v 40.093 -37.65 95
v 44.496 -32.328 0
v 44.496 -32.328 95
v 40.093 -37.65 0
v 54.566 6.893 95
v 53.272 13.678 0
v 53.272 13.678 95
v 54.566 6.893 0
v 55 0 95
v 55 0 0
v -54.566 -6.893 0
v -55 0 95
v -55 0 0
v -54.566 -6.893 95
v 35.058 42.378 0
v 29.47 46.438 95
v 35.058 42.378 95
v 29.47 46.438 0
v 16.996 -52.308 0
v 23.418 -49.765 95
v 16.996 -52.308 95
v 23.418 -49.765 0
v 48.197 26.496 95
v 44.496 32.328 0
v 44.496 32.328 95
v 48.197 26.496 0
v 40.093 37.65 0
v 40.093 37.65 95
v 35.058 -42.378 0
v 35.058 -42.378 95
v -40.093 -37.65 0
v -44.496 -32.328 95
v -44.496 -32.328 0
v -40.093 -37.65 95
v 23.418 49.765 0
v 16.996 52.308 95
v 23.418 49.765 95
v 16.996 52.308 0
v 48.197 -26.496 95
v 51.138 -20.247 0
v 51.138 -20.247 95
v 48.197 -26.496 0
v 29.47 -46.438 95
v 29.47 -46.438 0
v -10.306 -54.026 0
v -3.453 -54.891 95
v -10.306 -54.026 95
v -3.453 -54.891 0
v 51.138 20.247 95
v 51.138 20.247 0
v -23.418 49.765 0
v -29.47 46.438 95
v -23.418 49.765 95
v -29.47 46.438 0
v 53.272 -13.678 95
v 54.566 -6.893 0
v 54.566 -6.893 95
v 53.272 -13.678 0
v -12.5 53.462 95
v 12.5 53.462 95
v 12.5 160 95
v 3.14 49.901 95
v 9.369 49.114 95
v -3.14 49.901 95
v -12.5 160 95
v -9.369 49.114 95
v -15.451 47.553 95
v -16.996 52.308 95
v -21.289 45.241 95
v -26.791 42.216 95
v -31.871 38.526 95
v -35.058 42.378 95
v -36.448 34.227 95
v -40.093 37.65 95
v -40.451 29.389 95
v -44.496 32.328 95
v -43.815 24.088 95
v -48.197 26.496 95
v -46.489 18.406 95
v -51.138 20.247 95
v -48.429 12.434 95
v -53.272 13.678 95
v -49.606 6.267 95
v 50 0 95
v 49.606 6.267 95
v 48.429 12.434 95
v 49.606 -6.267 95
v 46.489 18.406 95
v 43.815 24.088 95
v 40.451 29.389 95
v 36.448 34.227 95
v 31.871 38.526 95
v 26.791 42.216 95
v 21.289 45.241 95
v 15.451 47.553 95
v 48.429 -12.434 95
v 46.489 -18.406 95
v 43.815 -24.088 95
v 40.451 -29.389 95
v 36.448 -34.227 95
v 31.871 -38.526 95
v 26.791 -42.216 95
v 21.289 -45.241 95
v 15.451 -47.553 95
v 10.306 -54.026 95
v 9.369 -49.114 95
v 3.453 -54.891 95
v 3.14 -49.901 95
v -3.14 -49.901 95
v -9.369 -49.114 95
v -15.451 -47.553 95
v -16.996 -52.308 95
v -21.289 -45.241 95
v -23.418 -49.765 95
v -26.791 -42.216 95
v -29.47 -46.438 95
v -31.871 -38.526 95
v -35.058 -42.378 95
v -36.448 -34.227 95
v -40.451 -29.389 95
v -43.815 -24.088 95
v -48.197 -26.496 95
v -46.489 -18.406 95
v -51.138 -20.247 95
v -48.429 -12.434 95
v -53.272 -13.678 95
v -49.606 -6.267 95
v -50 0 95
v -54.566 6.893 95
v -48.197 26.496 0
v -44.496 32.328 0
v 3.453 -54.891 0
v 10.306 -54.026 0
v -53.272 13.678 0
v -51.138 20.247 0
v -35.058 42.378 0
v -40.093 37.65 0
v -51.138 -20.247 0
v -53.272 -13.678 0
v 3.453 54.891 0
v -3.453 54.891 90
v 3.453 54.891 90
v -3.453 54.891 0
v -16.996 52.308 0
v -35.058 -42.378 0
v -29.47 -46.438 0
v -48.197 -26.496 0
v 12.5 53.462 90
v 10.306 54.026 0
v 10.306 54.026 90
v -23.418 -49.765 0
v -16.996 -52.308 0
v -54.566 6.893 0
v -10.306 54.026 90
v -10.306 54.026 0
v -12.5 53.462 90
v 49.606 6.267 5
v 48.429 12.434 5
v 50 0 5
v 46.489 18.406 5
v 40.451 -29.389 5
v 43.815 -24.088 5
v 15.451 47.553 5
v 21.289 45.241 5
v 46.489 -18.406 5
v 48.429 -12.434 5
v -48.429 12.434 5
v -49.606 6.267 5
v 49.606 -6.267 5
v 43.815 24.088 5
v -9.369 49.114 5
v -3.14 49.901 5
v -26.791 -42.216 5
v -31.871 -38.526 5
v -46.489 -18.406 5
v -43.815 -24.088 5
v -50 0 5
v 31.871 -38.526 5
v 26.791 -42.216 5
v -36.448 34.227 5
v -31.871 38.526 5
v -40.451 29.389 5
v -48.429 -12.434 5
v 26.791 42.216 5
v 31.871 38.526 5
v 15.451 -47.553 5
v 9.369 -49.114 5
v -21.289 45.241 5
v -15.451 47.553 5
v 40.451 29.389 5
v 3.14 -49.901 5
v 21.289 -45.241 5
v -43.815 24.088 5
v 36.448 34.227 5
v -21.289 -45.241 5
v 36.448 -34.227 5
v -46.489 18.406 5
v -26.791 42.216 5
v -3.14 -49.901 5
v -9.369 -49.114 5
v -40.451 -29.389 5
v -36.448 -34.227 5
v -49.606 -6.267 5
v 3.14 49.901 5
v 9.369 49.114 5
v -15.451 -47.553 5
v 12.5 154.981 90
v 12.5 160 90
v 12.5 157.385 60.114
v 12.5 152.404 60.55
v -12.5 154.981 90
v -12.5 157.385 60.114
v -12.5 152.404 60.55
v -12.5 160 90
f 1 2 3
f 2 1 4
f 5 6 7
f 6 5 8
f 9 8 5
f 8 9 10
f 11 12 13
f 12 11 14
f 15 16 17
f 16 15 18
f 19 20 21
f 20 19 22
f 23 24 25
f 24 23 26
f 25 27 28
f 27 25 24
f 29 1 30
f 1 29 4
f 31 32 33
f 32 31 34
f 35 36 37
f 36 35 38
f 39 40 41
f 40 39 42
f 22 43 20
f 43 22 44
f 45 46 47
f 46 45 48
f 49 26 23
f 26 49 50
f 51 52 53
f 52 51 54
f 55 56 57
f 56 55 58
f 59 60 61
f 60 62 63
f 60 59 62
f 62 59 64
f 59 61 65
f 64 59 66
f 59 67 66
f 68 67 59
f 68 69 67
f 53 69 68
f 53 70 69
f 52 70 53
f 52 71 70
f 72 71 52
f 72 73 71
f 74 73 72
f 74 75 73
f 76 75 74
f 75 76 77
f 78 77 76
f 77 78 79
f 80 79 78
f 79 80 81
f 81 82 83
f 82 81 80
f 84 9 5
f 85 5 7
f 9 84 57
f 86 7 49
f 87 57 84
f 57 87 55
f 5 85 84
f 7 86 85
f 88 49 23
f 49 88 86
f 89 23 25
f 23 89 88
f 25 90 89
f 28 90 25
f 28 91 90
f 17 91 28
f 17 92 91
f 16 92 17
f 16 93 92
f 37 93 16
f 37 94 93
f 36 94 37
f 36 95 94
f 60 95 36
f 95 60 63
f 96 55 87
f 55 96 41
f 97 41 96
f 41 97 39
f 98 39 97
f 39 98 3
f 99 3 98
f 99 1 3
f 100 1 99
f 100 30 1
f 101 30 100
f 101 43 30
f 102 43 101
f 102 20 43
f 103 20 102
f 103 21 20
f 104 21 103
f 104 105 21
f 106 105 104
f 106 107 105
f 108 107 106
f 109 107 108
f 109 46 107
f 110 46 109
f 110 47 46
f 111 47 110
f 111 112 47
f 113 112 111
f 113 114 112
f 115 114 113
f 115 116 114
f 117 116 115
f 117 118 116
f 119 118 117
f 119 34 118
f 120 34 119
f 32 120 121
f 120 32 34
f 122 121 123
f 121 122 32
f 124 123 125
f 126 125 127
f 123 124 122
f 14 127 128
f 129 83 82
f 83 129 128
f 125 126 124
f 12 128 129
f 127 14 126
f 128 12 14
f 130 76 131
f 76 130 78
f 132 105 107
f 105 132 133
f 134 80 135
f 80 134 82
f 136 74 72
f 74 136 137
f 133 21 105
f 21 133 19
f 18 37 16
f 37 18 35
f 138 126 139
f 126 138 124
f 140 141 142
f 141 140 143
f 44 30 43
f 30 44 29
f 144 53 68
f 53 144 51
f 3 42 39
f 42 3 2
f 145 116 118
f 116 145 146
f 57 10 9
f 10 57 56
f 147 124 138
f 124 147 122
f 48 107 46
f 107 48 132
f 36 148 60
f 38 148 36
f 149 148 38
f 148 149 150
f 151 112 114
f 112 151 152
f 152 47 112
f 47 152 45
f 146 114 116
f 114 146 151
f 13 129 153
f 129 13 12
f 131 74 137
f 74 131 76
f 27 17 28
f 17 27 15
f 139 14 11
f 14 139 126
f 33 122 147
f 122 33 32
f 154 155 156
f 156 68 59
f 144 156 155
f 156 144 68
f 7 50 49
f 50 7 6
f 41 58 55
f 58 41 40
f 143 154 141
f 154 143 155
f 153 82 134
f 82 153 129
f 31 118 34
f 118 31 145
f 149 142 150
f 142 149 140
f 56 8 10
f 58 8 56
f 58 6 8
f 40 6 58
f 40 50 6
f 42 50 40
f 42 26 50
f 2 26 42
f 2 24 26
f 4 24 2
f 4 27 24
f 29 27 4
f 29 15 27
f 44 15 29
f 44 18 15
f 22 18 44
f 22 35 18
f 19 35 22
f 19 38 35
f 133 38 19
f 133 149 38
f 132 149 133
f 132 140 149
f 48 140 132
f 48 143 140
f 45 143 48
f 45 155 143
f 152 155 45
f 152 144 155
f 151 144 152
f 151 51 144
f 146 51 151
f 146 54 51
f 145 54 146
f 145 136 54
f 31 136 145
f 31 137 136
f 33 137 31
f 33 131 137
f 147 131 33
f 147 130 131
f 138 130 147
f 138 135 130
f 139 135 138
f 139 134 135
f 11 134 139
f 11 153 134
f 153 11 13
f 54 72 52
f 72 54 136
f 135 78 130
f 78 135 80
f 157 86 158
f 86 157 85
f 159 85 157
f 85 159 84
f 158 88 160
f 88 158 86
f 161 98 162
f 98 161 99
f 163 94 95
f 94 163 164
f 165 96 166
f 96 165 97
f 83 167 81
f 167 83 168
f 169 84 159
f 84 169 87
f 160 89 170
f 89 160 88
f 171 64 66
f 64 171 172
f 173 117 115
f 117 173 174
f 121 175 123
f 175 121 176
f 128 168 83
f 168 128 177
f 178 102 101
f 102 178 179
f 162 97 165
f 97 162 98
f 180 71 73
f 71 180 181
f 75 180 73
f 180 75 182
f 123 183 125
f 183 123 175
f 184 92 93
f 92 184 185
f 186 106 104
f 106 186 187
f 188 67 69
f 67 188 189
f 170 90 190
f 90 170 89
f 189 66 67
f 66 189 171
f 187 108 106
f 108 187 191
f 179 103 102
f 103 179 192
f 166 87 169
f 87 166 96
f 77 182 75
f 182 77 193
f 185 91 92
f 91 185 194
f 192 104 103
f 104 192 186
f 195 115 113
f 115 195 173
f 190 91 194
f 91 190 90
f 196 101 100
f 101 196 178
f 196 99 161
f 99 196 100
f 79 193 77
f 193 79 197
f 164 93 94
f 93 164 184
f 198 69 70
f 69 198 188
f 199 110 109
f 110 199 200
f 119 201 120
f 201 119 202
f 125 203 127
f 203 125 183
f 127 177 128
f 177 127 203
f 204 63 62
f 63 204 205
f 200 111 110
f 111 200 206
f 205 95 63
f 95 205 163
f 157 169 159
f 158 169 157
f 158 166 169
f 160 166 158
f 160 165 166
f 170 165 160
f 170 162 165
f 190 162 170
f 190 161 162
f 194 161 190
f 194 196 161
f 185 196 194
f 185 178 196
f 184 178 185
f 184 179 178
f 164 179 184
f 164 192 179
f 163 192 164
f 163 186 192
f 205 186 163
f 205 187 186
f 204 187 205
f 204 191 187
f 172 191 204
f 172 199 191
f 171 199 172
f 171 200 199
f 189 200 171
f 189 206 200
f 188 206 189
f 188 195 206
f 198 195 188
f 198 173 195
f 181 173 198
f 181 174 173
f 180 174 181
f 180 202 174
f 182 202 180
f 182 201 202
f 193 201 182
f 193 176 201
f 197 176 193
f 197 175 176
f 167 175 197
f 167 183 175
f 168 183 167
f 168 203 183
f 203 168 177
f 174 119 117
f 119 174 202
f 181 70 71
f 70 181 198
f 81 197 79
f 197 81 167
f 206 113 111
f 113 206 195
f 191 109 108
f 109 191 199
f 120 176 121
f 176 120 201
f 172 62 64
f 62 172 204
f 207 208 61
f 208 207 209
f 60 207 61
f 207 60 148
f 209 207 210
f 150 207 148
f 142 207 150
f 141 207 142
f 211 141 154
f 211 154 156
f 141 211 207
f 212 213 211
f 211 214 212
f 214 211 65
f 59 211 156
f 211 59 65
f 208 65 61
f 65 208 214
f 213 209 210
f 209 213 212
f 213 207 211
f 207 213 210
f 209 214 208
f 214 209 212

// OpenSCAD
// - Half of the width of the inside of the cup (mm)
cupRadius=50; // [1:999]
// - Dpeth of the inside (mm)
cupDepth=90; // [1:999]
// - The width of the arm of the couch (mm)
handleDepth=105; //[1:999]
// - How thick to make the cup holder wall (mm)
wallThickness=5; // [.01:999]
// - How thick to make the handle wall (mm)
handleThickness=5; // [.01:999]
// - How long to make the clip (mm)
clipLength=30; // [1:999]
// - The angle of the clip (mm)
clipAngle=5; // [1:89]

/* [Hidden] */
$fn=50;

module inner_cup() {
  translate([0, 0, wallThickness]) {
      // plus one for preview
      cylinder(cupDepth +  1, cupRadius, cupRadius);
  }
}

module cup_holder() {
  difference() {
    outer_cupDepth=cupDepth + wallThickness;
    outer_cupRadius=cupRadius + wallThickness;
    cylinder(outer_cupDepth, outer_cupRadius, outer_cupRadius);

    inner_cup();
  }
}

module handle() {
    difference() {
      translate([-cupRadius/4, 0, cupDepth]) {
        cube([cupRadius/2, handleDepth + cupRadius + wallThickness, handleThickness]);
      }

      inner_cup();
    }
}

module clip() {
  translate([-cupRadius/4, handleDepth + cupRadius + wallThickness, cupDepth]) {
    rotate([- clipAngle - 180 , 0, 0]) {
      cube([cupRadius/2, handleThickness, clipLength]);
    }
  }
}

union() {
  cup_holder();
  handle();
  clip();
}
